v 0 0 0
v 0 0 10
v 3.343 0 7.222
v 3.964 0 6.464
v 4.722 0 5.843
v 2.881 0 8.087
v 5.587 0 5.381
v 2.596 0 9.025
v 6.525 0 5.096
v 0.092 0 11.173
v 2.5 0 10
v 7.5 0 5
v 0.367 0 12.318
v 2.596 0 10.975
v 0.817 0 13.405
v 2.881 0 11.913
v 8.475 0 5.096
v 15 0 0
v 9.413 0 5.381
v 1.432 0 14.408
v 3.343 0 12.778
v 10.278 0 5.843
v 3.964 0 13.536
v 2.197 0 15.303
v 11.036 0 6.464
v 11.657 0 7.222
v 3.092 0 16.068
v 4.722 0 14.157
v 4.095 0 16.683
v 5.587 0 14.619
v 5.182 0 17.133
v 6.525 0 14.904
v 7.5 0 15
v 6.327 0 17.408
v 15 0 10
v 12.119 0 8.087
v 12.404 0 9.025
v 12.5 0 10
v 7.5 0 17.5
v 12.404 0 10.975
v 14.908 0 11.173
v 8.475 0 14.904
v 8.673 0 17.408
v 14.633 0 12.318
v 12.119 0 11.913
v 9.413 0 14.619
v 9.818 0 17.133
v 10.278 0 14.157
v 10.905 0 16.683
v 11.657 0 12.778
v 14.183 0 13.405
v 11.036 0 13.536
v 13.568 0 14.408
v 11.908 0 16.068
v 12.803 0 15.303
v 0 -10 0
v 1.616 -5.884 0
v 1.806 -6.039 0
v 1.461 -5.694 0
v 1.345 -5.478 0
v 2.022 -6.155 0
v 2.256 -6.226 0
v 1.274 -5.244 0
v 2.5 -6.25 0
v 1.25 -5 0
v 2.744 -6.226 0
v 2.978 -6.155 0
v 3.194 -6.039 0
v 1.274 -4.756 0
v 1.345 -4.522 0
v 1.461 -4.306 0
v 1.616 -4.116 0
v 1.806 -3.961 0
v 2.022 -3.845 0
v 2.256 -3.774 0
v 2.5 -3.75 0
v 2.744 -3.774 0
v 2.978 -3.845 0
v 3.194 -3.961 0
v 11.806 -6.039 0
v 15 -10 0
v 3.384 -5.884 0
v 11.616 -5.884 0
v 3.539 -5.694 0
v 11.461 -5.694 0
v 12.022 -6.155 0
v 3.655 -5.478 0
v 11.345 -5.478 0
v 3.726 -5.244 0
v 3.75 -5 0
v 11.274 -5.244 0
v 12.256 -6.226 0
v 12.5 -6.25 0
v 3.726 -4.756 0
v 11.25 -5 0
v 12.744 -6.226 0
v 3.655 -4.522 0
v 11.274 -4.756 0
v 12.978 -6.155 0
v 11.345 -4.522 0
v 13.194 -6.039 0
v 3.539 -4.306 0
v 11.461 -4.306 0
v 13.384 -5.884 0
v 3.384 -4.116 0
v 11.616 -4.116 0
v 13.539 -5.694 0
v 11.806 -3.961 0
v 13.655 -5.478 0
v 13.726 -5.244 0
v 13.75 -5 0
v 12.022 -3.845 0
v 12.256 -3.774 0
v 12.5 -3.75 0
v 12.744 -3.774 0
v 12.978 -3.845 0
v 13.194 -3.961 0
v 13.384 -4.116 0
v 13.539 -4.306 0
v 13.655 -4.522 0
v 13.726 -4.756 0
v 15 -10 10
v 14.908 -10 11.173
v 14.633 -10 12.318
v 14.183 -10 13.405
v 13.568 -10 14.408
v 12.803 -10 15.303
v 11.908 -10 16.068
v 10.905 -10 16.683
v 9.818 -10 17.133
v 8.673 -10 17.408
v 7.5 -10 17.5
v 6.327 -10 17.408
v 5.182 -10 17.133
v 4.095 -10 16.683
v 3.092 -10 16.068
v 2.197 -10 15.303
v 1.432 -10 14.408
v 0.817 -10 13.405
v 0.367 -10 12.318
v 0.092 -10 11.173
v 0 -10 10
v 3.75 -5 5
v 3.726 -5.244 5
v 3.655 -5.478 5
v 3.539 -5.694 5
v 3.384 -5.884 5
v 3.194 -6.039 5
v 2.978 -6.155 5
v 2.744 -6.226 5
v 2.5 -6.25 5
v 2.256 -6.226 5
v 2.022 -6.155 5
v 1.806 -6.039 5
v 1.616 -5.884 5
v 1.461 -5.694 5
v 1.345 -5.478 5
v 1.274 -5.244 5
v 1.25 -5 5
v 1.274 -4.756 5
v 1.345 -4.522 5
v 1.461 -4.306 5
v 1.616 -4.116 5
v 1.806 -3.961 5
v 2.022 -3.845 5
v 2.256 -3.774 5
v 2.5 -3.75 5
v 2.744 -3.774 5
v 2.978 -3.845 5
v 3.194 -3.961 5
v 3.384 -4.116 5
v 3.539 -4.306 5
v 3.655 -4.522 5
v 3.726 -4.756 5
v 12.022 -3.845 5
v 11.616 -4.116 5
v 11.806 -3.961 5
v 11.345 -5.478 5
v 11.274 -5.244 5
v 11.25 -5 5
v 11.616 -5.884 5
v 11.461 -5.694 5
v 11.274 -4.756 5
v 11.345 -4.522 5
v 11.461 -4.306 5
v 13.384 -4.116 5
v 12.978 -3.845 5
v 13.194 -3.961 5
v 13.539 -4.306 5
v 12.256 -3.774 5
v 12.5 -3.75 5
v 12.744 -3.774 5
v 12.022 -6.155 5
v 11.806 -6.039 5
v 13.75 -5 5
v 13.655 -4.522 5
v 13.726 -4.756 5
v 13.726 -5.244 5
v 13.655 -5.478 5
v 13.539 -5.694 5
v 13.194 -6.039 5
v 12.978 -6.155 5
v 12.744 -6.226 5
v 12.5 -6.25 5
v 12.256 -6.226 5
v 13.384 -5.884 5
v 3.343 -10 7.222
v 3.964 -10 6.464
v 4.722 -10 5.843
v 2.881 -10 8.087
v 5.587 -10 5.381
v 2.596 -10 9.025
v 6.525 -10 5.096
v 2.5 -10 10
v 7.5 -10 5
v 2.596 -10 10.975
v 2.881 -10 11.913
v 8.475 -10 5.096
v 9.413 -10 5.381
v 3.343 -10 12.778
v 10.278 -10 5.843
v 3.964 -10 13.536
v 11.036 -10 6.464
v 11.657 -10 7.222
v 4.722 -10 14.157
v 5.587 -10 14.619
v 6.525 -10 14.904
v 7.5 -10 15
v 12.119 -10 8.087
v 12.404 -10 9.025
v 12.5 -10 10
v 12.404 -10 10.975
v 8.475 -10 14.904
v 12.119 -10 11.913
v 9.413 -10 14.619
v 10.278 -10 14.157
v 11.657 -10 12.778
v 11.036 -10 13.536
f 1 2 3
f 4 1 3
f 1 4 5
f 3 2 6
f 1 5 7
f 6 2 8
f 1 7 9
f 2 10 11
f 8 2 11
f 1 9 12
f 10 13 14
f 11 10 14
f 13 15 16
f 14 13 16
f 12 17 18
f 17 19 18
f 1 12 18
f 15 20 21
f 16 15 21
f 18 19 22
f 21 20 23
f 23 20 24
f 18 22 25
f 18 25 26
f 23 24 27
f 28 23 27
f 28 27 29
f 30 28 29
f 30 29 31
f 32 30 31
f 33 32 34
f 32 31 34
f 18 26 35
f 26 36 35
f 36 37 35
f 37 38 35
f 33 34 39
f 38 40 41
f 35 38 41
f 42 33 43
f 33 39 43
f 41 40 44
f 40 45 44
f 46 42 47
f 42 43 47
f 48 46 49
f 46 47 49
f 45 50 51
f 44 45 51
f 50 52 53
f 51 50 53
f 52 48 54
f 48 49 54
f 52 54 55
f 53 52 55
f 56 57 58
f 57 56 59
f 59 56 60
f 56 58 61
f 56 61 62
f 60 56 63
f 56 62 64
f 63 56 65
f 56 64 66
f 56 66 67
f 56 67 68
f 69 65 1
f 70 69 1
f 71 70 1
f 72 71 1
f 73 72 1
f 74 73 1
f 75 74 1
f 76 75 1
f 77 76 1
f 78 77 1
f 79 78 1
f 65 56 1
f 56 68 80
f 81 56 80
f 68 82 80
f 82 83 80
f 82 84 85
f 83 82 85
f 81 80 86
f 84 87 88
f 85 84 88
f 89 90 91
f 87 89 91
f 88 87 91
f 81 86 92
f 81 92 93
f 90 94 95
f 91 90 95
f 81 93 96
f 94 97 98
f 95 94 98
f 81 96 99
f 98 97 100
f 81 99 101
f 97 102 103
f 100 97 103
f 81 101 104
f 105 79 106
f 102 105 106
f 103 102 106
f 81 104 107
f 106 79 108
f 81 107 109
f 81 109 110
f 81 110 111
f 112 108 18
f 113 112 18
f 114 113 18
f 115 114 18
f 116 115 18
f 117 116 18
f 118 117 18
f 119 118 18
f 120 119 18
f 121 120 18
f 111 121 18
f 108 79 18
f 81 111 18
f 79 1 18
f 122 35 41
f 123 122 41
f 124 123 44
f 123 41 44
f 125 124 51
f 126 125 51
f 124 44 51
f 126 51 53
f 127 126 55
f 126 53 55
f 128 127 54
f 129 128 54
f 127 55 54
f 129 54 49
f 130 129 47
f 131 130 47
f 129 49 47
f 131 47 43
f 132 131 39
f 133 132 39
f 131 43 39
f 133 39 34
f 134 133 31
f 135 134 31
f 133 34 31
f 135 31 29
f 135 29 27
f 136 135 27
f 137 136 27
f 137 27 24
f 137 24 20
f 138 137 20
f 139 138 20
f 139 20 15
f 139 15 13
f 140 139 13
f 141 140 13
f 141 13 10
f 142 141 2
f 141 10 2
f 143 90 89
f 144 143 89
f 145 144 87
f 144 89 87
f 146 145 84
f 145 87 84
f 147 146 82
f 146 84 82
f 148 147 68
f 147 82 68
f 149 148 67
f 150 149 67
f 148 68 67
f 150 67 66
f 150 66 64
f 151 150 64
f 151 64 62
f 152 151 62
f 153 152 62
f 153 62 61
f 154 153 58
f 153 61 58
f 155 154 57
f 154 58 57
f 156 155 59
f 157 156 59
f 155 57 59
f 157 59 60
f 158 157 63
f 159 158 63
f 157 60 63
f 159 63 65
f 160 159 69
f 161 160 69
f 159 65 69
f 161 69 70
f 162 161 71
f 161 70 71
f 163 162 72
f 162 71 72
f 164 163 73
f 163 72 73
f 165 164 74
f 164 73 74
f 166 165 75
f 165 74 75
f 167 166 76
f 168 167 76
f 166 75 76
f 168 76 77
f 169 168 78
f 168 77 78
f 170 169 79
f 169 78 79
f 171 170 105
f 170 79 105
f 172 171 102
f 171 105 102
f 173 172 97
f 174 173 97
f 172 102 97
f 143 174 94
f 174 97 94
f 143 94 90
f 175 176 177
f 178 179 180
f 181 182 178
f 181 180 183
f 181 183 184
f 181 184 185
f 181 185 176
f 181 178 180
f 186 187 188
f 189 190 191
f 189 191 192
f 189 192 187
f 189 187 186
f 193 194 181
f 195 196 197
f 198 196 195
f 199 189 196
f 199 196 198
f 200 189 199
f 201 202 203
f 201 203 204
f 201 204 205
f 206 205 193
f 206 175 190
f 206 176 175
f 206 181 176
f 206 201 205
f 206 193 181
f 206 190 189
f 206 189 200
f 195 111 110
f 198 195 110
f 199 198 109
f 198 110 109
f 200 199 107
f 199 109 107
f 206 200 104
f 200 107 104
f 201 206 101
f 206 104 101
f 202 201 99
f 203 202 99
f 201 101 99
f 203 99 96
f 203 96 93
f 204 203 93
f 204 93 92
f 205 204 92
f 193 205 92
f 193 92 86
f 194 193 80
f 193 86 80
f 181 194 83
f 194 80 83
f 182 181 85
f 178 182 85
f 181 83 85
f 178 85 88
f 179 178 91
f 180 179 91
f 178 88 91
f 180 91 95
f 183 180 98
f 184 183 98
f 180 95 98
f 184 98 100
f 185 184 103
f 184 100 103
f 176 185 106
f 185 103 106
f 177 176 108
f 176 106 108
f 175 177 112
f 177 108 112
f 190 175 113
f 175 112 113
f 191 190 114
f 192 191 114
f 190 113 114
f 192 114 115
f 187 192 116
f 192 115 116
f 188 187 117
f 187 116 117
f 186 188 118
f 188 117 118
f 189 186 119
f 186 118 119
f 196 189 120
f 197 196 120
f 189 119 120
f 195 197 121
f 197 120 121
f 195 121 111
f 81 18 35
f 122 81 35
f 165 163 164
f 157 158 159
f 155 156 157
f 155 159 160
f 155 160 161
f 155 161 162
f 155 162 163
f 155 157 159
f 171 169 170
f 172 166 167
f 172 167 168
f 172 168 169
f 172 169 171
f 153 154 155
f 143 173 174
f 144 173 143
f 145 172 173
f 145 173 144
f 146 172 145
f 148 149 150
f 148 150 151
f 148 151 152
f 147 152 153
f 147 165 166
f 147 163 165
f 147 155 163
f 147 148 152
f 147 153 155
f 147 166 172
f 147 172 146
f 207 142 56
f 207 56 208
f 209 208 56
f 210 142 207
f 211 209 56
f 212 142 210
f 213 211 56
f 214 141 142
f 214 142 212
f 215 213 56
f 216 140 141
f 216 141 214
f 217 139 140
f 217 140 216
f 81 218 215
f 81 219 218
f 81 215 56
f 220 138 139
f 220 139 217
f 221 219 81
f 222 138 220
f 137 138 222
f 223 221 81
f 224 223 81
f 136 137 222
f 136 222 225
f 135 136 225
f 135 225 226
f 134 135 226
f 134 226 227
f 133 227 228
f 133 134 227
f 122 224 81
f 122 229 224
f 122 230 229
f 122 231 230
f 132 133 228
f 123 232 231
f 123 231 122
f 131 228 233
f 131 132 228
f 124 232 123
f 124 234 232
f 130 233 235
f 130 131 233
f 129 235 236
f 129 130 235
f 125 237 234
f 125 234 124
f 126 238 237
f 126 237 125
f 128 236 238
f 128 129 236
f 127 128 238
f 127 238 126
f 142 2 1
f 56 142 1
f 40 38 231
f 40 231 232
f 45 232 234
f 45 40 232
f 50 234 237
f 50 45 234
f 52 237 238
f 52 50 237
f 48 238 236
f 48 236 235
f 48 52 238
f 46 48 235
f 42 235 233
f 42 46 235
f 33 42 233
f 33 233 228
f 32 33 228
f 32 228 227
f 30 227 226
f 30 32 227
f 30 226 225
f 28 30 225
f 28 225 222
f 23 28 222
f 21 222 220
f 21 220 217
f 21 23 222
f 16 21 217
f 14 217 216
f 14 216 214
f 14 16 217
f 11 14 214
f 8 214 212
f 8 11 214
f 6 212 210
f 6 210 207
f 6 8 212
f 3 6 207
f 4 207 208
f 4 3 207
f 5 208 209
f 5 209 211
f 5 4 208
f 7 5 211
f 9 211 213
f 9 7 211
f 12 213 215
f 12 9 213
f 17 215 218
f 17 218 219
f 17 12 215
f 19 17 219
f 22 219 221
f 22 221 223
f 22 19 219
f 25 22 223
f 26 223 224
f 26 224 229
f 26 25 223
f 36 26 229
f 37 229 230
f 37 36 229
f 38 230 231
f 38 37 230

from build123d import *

# Parameters (mm, degrees)
F0_R     = 5
F1_DEPTH = 10
F2_R     = 1.25
F3_DEPTH = 5


with BuildPart() as f1:
    # F0 (on Front) → F1 (new body)
    with BuildSketch(Plane.XZ):
        with BuildLine():
            Line((0, 10), (0, 0))
            Line((0, 0), (15, 0))
            Line((15, 0), (15, 10))
            ThreePointArc((15, 10), (7.5, 17.5), (0, 10))
        make_face()
        with Locations((7.5, 10)):
            Circle(F0_R, mode=Mode.SUBTRACT)
    extrude(amount=F1_DEPTH)

    # F2 (on face) → F3 (cut)
    with BuildSketch(Plane(origin=(0, 0, 0), x_dir=(1, 0, 0), z_dir=(0, 0, -1))):
        with Locations((2.5, 5)):
            Circle(F2_R)
        with Locations((12.5, 5)):
            Circle(F2_R)
    extrude(amount=-F3_DEPTH, mode=Mode.SUBTRACT)


solid = f1.part
